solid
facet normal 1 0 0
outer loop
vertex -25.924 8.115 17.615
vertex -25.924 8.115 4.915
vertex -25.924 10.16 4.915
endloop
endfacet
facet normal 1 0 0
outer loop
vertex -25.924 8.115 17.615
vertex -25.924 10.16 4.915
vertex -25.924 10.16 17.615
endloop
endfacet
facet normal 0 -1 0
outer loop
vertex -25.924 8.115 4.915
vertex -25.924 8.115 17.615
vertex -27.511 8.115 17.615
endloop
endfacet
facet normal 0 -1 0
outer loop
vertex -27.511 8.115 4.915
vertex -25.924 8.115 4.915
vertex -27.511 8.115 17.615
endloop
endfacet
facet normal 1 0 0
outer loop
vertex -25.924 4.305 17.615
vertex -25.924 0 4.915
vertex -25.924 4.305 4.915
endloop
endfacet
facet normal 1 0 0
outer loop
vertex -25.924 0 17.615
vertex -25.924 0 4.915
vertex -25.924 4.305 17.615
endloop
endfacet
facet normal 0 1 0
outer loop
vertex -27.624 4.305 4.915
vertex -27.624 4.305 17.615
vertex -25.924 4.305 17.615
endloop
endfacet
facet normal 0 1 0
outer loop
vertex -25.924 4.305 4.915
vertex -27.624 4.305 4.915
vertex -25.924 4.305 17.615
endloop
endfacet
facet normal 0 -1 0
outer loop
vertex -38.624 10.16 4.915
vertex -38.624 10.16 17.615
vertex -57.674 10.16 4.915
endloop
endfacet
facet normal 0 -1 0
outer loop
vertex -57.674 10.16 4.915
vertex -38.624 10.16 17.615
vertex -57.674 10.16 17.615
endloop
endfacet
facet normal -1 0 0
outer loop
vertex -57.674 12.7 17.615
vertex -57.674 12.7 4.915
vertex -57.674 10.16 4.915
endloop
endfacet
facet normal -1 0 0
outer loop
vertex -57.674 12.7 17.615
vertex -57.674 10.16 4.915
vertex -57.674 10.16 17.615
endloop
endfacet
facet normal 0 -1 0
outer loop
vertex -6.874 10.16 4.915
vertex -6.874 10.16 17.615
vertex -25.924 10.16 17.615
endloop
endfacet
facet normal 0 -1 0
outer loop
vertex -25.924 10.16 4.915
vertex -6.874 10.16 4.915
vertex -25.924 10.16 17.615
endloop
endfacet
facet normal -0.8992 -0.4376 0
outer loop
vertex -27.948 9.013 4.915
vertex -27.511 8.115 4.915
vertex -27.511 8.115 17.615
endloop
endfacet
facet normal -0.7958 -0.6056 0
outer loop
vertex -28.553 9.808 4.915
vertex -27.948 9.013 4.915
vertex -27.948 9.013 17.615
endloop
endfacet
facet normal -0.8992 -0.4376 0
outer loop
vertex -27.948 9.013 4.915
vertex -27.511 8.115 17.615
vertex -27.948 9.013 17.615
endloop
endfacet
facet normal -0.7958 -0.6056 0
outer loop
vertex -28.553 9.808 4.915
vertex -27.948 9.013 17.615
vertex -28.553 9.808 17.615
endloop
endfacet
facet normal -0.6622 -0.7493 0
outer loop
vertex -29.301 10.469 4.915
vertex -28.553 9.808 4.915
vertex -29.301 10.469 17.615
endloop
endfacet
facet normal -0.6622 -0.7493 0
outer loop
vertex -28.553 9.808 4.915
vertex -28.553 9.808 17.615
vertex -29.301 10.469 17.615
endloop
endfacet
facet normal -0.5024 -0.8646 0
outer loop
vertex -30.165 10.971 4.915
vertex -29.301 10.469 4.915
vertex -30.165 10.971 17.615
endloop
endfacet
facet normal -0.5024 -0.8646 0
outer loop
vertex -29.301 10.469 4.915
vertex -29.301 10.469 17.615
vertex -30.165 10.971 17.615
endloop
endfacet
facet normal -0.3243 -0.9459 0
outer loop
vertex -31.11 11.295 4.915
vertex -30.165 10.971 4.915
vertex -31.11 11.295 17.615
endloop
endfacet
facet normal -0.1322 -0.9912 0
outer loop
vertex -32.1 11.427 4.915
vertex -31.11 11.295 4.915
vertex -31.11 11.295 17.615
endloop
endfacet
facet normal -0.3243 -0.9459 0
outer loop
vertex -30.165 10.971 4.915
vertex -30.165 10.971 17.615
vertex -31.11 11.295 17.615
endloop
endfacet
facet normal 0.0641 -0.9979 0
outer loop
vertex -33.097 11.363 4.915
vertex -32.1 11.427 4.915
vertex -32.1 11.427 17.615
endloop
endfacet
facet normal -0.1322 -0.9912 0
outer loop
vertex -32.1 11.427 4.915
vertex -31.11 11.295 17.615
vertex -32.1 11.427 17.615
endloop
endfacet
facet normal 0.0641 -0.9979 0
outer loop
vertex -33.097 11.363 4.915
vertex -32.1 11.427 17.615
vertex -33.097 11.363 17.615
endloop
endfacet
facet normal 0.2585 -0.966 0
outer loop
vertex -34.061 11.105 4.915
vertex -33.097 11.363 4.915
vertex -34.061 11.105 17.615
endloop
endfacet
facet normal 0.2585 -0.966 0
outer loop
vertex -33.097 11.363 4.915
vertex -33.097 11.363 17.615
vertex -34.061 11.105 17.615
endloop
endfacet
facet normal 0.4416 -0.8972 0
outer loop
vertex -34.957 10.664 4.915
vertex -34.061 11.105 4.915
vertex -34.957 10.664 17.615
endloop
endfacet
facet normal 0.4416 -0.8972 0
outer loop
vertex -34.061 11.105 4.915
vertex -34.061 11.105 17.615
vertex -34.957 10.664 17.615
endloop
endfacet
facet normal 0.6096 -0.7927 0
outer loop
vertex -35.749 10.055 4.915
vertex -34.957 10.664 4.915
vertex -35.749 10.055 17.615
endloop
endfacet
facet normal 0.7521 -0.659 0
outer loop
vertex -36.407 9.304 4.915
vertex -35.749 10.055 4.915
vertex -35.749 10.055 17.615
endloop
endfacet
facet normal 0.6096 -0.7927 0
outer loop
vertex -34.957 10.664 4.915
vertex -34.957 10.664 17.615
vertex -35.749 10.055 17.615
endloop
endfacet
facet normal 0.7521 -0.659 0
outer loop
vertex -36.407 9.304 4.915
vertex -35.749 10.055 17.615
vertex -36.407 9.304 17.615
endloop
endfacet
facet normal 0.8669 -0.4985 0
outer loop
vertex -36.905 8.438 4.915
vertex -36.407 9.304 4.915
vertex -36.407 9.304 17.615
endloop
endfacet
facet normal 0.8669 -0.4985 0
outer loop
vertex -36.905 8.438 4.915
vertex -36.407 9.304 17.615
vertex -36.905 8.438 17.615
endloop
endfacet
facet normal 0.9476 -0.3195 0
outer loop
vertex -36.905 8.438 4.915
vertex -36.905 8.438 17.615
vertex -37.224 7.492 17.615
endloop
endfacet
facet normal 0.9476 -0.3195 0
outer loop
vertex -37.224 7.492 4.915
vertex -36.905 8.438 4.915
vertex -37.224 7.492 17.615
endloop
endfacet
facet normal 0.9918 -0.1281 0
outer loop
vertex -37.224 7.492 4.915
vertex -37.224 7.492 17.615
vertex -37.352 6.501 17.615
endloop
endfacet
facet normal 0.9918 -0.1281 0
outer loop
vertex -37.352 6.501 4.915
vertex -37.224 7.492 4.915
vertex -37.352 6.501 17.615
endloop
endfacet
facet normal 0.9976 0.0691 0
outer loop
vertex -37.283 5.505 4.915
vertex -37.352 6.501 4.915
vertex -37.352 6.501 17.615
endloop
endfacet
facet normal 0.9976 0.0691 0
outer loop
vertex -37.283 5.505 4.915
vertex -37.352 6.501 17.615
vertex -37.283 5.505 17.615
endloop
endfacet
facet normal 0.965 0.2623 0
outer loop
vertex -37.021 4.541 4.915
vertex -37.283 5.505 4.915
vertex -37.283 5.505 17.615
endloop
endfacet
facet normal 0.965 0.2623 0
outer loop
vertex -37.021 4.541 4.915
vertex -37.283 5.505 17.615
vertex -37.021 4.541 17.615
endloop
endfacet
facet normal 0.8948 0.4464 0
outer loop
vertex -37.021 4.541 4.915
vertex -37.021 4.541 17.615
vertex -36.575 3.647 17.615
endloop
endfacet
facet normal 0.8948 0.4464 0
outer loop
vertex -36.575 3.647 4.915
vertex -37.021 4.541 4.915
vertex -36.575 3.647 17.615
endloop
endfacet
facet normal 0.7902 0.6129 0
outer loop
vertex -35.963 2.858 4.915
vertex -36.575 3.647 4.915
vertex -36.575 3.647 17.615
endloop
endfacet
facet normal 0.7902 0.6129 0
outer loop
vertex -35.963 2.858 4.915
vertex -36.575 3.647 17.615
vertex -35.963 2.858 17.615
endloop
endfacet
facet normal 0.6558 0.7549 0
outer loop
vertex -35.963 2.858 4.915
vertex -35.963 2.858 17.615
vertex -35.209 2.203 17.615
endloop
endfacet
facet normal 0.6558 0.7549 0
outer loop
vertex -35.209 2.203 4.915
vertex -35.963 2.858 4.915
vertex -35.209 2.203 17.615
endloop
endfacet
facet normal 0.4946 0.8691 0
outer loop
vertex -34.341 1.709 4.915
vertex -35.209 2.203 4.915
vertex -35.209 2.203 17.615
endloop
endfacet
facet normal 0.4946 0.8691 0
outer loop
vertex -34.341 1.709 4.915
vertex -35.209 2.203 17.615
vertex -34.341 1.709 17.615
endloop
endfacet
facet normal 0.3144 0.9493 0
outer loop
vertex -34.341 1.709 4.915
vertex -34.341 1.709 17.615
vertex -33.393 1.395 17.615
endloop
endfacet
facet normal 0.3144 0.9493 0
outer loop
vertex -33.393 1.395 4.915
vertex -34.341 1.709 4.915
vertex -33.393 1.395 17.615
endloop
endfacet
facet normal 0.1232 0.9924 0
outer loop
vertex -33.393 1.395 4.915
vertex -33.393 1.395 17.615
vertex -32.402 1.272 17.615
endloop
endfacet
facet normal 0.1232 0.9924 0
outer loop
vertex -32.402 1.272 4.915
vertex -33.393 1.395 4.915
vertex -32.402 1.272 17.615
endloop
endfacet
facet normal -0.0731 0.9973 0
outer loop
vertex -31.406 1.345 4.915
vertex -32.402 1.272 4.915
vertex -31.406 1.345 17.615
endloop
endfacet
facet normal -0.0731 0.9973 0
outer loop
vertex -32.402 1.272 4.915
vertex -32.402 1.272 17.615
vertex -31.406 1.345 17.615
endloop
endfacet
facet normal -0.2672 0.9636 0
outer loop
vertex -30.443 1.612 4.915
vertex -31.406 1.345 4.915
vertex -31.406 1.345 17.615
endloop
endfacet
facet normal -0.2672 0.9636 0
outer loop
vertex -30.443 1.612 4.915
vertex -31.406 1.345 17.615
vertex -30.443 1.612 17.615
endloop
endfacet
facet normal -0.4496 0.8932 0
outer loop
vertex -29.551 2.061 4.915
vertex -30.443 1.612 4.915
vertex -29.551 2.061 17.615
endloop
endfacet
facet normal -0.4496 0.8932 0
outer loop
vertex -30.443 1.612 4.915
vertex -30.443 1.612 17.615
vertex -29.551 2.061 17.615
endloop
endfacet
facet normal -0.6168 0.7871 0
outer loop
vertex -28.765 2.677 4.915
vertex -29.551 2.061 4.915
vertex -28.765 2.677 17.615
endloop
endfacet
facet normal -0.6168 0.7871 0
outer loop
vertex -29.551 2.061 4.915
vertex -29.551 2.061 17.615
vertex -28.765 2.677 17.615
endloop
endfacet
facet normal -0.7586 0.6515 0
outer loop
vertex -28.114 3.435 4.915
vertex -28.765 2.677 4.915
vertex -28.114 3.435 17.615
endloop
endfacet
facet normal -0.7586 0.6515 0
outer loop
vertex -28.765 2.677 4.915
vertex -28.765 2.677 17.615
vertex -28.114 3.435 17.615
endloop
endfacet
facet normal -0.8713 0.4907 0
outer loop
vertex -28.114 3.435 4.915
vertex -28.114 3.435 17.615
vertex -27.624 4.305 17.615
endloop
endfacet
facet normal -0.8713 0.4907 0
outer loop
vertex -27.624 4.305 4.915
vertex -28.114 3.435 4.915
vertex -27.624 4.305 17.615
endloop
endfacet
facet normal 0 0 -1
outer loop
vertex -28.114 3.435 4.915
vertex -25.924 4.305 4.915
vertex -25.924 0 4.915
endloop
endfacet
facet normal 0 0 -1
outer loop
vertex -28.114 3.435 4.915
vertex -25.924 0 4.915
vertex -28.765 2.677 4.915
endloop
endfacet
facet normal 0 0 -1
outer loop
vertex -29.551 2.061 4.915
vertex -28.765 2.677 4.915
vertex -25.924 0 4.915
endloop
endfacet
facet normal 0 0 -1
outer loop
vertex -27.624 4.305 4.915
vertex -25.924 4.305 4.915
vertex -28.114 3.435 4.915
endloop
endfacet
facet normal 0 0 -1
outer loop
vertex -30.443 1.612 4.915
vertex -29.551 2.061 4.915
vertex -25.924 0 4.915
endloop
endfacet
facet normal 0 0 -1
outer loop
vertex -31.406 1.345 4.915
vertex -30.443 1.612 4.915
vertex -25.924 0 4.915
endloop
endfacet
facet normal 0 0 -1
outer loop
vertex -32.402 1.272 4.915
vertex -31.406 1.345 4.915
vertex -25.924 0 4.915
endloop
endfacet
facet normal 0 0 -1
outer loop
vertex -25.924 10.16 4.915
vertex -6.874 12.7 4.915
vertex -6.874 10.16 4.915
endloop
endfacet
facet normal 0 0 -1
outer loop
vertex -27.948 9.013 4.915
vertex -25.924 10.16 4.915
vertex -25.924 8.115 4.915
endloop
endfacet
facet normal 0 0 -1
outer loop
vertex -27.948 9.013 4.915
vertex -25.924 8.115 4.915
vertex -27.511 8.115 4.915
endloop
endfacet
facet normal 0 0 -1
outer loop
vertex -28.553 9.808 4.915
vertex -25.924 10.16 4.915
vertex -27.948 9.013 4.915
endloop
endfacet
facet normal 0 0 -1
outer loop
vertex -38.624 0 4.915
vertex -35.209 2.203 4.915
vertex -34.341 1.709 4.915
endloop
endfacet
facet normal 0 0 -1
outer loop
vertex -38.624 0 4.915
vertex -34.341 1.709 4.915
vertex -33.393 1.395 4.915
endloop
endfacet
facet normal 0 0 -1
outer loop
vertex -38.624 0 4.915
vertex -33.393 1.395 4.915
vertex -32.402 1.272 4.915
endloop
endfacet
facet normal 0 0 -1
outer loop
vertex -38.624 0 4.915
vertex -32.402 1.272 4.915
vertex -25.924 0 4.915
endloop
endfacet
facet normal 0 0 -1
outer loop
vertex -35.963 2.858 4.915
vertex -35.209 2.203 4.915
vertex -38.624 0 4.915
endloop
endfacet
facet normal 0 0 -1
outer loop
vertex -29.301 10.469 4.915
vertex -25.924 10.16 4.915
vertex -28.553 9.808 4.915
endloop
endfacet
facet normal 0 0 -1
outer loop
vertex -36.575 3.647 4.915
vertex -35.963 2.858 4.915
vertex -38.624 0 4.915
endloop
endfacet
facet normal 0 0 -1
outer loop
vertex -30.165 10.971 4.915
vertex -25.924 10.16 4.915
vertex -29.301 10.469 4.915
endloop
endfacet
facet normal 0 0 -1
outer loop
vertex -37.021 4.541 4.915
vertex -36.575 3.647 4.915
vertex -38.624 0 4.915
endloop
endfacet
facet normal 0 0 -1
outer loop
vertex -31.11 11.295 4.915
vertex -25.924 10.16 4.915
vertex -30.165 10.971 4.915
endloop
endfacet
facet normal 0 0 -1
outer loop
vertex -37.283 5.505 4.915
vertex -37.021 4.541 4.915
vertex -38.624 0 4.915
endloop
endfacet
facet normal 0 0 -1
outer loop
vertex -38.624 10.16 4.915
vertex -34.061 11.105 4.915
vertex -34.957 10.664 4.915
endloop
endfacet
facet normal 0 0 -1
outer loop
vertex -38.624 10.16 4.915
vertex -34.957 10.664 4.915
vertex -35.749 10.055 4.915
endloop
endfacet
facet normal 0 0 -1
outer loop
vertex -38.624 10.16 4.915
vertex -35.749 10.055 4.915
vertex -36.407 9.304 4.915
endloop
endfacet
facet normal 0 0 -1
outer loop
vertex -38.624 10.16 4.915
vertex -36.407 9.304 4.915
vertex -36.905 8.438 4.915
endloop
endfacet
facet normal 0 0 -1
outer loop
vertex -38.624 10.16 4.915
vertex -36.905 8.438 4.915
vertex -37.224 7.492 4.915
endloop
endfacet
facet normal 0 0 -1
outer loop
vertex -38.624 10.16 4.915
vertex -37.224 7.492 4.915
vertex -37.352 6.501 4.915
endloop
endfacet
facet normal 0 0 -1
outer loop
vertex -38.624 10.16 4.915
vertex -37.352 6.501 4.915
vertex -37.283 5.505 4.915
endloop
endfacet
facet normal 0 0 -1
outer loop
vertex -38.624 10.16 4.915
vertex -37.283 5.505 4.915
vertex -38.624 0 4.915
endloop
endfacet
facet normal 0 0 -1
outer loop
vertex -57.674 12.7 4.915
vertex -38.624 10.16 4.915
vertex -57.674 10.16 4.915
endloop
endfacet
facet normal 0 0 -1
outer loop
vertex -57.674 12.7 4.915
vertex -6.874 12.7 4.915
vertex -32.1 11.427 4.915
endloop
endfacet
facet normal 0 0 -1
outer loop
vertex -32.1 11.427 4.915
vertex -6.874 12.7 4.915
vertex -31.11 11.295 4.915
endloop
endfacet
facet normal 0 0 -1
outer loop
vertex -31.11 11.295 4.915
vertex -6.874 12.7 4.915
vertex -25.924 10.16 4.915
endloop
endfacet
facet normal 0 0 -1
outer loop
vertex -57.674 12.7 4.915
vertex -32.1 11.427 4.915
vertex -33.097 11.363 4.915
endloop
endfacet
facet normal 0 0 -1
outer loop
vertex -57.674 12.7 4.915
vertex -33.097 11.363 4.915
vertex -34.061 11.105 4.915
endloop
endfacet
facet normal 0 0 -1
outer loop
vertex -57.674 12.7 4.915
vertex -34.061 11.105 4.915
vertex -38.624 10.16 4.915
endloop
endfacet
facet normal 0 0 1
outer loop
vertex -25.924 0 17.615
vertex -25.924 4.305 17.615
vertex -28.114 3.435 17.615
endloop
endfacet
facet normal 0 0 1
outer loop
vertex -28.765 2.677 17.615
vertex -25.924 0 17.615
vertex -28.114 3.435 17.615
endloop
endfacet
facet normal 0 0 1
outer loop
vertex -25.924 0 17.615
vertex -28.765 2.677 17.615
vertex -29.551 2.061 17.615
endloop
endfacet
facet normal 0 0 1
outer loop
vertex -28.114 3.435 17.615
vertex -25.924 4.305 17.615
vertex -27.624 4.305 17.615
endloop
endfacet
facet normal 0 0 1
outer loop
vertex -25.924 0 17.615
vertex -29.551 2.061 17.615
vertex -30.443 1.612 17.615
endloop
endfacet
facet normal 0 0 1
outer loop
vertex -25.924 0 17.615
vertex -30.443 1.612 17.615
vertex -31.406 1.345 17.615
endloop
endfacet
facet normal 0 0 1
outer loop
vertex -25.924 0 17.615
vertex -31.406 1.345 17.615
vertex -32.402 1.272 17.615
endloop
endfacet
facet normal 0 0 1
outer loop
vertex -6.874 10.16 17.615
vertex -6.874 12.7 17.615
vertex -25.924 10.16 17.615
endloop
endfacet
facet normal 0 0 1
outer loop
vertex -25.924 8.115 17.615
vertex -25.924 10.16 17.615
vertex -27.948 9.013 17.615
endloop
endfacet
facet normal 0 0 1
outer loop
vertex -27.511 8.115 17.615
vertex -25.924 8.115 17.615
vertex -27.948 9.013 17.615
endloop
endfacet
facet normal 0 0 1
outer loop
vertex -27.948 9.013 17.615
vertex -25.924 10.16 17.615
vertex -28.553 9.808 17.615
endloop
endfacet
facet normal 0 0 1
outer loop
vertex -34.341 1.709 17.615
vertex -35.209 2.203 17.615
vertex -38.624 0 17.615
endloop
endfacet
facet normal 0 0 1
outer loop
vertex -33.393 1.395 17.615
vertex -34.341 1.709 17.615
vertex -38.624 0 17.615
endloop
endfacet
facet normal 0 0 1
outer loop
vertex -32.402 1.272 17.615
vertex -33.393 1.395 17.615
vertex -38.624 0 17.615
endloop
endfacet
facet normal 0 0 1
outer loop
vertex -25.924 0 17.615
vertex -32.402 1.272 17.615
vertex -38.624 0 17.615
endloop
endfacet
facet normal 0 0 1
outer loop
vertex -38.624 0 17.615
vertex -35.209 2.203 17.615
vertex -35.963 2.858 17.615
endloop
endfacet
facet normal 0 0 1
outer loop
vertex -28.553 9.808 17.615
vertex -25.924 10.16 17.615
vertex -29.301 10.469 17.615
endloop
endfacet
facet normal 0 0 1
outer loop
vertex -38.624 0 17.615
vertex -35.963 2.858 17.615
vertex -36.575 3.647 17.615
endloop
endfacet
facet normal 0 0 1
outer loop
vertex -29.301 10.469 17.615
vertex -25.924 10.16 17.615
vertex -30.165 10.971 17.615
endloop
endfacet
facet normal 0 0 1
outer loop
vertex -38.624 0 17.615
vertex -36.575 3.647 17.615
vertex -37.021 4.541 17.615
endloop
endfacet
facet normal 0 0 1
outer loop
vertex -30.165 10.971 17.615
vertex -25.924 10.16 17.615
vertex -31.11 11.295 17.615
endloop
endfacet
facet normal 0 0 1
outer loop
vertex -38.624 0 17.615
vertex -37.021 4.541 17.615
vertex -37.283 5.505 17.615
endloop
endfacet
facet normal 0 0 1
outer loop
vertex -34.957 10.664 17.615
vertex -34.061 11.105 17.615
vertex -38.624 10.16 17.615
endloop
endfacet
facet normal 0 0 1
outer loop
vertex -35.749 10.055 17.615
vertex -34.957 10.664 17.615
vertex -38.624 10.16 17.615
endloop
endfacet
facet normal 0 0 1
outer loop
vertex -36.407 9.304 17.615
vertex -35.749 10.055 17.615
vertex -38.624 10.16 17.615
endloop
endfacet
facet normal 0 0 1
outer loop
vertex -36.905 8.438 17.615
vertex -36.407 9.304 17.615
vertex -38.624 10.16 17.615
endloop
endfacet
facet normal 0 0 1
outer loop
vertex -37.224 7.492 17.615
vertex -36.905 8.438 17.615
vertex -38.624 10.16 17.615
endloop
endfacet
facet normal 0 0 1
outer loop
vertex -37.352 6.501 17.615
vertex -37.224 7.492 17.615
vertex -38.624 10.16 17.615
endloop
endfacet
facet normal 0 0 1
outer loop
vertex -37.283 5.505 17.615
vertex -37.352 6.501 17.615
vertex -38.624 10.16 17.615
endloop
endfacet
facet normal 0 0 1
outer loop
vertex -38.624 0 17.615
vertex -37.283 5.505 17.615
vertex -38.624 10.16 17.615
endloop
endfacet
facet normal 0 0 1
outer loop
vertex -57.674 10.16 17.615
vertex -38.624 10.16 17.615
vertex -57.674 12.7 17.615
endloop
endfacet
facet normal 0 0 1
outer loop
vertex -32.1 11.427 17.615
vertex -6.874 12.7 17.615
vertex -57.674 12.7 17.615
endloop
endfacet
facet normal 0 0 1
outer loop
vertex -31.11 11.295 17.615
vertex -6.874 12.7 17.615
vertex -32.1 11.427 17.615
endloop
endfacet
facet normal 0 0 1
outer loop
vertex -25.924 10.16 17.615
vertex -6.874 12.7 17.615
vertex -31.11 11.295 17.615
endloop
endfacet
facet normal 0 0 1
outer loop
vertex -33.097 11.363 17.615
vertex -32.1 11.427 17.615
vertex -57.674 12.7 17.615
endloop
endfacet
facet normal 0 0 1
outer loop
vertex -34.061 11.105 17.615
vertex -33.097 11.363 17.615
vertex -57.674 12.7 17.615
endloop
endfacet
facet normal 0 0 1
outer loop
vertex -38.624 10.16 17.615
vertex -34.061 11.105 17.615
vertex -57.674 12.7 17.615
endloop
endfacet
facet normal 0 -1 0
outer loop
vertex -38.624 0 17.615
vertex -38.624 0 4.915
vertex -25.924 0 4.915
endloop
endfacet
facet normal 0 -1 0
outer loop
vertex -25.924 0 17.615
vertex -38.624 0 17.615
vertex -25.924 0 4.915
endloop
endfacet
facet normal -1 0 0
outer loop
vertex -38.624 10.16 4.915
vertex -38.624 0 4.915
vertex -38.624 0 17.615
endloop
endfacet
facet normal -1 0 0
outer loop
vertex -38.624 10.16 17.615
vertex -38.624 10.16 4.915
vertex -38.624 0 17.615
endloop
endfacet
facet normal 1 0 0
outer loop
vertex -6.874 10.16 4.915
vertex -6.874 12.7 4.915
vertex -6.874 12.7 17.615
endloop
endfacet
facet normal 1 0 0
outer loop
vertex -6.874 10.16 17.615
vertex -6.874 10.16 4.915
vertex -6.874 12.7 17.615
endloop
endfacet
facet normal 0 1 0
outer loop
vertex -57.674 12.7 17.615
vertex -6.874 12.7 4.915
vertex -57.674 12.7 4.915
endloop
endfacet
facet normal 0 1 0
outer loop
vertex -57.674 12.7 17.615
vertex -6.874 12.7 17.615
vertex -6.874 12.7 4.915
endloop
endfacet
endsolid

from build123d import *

# Parameters (mm, degrees)
F0_W     = 12.7
F0_H     = 12.7
F1_DEPTH = 12.7
F3_DEPTH = 38.1
F4_W     = 19.05
F4_H     = 12.7
F5_DEPTH = 2.54


with BuildPart() as f1:
    # F0 (on Front) → F1 (new body)
    with BuildSketch(Plane.XZ):
        with Locations((-32.274292, 11.265401)):
            Rectangle(F0_W, F0_H)
    extrude(amount=-F1_DEPTH)

    # F2 (on face) → F3 (cut)
    with BuildSketch(Plane.XY.offset(17.615401)):
        with BuildLine():
            Line((-25.924292, 8.11507), (-27.510793, 8.11507))
            ThreePointArc((-27.510793, 8.11507), (-37.352049, 6.500956), (-27.62406, 4.30507))
            Line((-27.62406, 4.30507), (-25.924292, 4.30507))
            Line((-25.924292, 4.30507), (-25.924292, 8.11507))
        make_face()
    extrude(amount=-F3_DEPTH, mode=Mode.SUBTRACT)

    # F4 (on face) → F5 (join)
    with BuildSketch(Plane(origin=(0, 12.7, 0), x_dir=(-1, 0, 0), z_dir=(0, 1, 0))):
        with Locations((48.149292, 11.265401)):
            Rectangle(F4_W, F4_H)
        with Locations((16.399292, 11.265401)):
            Rectangle(F4_W, F4_H)
    extrude(amount=-F5_DEPTH)


solid = f1.part
